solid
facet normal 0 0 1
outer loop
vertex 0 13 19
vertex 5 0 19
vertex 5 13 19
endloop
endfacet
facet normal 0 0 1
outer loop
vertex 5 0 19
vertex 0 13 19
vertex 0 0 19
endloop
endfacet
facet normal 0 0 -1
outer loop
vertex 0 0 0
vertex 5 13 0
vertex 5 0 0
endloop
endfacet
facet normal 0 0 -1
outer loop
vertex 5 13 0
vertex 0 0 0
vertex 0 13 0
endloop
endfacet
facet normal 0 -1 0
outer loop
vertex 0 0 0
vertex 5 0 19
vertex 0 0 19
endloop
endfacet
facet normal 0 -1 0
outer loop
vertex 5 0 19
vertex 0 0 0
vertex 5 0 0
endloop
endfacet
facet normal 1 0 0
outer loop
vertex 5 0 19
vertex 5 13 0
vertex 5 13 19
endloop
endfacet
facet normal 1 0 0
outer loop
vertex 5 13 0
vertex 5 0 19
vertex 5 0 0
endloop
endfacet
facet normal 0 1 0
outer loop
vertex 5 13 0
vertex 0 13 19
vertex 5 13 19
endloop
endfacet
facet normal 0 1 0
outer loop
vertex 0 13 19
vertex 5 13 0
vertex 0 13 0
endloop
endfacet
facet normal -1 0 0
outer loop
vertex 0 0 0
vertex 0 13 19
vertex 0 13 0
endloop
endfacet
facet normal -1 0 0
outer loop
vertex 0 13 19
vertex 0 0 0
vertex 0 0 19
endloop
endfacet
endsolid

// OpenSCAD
// Generated by SolidPython 1.0.1 on 2020-07-29 00:39:26


cube(size = [5, 13, 19]);
/***********************************************
*********      SolidPython code:      **********
************************************************
 
# import packages: SolidPython
from solid import *
from solid.utils import *
from itertools import chain, combinations


class Resize:

    def __init__(self, scad_file):
        self.scad_file = scad_file
        #self.scad_file = import_scad(scad_file)
        # cone/cylinder param:
        self.r1 = 0
        self.r2 = 0
        self.h = 0
        # rectangular prism param:
        self.w = 0
        self.l = 0
        # ellipse param:
        self.r = 0

    # import OpenScad code (file name corresponds to shape)


    # classify shape + parameters
    def assign(self, param1, param2, param3):
        if self.scad_file == 'cone.scad':
            self.r1 = param1
            self.r2 = param2
            self.h = param3
        elif self.scad_file == 'cylinder.scad':
            self.r1 = param1
            self.r2 = param2
            self.h = param3
        elif self.scad_file == 'rectangularPrism.scad':
            self.h = param1
            self.l = param2
            self.w = param3
        else:
            self.r = param1
            self.h = param2

    # resize parameters
    def iterate(self):
        x = range(3, 20, 2)
        i = 1
        if self.scad_file == 'cone.scad':
            tempList = list(combinations(x, 2))
            for temp in tempList:
                param1 = temp[0]
                param2 = temp[1]
                filepath = 'produced_scad_files/' + 'cone' + str(param1) + '_' + str(param2) + '_' + '.scad'
                scad_render_to_file(cylinder(h=param1, r1=param2, r2=0), filepath)

        elif self.scad_file == 'cylinder.scad':
            tempList = list(combinations(x, 3))
            for temp in tempList:
                param1 = temp[0]
                param2 = temp[1]
                filepath = 'produced_scad_files/' + 'cylinder' + str(param1) + '_' + str(param2) + '_' + '.scad'
                scad_render_to_file(cylinder(h=param1, r1=param2, r2=param2), filepath)

        elif self.scad_file == 'rectangularPrism.scad':
            tempList = list(combinations(x, 3))
            for temp in tempList:
                param1 = temp[0]
                param2 = temp[1]
                param3 = temp[2]
                filepath = 'produced_scad_files/' + 'rectangularPrism' + str(param1) + '_' + str(param2) + '_' + str(
                    param3) + '.scad'
                scad_render_to_file(cube(size=(param1, param2, param3)), filepath)

        elif self.scad_file == 'ellipse.scad':
            tempList = list(combinations(x, 4))
            for temp in tempList:
                param1 = temp[0]
                param2 = temp[1]
                param3 = temp[2]
                param4 = temp[3]
                filepath = 'produced_scad_files/' + 'ellipse' + str(param1) + '_' + str(param2) + '_' + str(param3) + '_' + str(param4) + '.scad'
                scad_render_to_file(scale([param1, param2, param3])(sphere(r=param4)), filepath)

    def render_to_scadfile(self):
        scad_render_to_file(scad, 'example.scad') 
 
************************************************/
